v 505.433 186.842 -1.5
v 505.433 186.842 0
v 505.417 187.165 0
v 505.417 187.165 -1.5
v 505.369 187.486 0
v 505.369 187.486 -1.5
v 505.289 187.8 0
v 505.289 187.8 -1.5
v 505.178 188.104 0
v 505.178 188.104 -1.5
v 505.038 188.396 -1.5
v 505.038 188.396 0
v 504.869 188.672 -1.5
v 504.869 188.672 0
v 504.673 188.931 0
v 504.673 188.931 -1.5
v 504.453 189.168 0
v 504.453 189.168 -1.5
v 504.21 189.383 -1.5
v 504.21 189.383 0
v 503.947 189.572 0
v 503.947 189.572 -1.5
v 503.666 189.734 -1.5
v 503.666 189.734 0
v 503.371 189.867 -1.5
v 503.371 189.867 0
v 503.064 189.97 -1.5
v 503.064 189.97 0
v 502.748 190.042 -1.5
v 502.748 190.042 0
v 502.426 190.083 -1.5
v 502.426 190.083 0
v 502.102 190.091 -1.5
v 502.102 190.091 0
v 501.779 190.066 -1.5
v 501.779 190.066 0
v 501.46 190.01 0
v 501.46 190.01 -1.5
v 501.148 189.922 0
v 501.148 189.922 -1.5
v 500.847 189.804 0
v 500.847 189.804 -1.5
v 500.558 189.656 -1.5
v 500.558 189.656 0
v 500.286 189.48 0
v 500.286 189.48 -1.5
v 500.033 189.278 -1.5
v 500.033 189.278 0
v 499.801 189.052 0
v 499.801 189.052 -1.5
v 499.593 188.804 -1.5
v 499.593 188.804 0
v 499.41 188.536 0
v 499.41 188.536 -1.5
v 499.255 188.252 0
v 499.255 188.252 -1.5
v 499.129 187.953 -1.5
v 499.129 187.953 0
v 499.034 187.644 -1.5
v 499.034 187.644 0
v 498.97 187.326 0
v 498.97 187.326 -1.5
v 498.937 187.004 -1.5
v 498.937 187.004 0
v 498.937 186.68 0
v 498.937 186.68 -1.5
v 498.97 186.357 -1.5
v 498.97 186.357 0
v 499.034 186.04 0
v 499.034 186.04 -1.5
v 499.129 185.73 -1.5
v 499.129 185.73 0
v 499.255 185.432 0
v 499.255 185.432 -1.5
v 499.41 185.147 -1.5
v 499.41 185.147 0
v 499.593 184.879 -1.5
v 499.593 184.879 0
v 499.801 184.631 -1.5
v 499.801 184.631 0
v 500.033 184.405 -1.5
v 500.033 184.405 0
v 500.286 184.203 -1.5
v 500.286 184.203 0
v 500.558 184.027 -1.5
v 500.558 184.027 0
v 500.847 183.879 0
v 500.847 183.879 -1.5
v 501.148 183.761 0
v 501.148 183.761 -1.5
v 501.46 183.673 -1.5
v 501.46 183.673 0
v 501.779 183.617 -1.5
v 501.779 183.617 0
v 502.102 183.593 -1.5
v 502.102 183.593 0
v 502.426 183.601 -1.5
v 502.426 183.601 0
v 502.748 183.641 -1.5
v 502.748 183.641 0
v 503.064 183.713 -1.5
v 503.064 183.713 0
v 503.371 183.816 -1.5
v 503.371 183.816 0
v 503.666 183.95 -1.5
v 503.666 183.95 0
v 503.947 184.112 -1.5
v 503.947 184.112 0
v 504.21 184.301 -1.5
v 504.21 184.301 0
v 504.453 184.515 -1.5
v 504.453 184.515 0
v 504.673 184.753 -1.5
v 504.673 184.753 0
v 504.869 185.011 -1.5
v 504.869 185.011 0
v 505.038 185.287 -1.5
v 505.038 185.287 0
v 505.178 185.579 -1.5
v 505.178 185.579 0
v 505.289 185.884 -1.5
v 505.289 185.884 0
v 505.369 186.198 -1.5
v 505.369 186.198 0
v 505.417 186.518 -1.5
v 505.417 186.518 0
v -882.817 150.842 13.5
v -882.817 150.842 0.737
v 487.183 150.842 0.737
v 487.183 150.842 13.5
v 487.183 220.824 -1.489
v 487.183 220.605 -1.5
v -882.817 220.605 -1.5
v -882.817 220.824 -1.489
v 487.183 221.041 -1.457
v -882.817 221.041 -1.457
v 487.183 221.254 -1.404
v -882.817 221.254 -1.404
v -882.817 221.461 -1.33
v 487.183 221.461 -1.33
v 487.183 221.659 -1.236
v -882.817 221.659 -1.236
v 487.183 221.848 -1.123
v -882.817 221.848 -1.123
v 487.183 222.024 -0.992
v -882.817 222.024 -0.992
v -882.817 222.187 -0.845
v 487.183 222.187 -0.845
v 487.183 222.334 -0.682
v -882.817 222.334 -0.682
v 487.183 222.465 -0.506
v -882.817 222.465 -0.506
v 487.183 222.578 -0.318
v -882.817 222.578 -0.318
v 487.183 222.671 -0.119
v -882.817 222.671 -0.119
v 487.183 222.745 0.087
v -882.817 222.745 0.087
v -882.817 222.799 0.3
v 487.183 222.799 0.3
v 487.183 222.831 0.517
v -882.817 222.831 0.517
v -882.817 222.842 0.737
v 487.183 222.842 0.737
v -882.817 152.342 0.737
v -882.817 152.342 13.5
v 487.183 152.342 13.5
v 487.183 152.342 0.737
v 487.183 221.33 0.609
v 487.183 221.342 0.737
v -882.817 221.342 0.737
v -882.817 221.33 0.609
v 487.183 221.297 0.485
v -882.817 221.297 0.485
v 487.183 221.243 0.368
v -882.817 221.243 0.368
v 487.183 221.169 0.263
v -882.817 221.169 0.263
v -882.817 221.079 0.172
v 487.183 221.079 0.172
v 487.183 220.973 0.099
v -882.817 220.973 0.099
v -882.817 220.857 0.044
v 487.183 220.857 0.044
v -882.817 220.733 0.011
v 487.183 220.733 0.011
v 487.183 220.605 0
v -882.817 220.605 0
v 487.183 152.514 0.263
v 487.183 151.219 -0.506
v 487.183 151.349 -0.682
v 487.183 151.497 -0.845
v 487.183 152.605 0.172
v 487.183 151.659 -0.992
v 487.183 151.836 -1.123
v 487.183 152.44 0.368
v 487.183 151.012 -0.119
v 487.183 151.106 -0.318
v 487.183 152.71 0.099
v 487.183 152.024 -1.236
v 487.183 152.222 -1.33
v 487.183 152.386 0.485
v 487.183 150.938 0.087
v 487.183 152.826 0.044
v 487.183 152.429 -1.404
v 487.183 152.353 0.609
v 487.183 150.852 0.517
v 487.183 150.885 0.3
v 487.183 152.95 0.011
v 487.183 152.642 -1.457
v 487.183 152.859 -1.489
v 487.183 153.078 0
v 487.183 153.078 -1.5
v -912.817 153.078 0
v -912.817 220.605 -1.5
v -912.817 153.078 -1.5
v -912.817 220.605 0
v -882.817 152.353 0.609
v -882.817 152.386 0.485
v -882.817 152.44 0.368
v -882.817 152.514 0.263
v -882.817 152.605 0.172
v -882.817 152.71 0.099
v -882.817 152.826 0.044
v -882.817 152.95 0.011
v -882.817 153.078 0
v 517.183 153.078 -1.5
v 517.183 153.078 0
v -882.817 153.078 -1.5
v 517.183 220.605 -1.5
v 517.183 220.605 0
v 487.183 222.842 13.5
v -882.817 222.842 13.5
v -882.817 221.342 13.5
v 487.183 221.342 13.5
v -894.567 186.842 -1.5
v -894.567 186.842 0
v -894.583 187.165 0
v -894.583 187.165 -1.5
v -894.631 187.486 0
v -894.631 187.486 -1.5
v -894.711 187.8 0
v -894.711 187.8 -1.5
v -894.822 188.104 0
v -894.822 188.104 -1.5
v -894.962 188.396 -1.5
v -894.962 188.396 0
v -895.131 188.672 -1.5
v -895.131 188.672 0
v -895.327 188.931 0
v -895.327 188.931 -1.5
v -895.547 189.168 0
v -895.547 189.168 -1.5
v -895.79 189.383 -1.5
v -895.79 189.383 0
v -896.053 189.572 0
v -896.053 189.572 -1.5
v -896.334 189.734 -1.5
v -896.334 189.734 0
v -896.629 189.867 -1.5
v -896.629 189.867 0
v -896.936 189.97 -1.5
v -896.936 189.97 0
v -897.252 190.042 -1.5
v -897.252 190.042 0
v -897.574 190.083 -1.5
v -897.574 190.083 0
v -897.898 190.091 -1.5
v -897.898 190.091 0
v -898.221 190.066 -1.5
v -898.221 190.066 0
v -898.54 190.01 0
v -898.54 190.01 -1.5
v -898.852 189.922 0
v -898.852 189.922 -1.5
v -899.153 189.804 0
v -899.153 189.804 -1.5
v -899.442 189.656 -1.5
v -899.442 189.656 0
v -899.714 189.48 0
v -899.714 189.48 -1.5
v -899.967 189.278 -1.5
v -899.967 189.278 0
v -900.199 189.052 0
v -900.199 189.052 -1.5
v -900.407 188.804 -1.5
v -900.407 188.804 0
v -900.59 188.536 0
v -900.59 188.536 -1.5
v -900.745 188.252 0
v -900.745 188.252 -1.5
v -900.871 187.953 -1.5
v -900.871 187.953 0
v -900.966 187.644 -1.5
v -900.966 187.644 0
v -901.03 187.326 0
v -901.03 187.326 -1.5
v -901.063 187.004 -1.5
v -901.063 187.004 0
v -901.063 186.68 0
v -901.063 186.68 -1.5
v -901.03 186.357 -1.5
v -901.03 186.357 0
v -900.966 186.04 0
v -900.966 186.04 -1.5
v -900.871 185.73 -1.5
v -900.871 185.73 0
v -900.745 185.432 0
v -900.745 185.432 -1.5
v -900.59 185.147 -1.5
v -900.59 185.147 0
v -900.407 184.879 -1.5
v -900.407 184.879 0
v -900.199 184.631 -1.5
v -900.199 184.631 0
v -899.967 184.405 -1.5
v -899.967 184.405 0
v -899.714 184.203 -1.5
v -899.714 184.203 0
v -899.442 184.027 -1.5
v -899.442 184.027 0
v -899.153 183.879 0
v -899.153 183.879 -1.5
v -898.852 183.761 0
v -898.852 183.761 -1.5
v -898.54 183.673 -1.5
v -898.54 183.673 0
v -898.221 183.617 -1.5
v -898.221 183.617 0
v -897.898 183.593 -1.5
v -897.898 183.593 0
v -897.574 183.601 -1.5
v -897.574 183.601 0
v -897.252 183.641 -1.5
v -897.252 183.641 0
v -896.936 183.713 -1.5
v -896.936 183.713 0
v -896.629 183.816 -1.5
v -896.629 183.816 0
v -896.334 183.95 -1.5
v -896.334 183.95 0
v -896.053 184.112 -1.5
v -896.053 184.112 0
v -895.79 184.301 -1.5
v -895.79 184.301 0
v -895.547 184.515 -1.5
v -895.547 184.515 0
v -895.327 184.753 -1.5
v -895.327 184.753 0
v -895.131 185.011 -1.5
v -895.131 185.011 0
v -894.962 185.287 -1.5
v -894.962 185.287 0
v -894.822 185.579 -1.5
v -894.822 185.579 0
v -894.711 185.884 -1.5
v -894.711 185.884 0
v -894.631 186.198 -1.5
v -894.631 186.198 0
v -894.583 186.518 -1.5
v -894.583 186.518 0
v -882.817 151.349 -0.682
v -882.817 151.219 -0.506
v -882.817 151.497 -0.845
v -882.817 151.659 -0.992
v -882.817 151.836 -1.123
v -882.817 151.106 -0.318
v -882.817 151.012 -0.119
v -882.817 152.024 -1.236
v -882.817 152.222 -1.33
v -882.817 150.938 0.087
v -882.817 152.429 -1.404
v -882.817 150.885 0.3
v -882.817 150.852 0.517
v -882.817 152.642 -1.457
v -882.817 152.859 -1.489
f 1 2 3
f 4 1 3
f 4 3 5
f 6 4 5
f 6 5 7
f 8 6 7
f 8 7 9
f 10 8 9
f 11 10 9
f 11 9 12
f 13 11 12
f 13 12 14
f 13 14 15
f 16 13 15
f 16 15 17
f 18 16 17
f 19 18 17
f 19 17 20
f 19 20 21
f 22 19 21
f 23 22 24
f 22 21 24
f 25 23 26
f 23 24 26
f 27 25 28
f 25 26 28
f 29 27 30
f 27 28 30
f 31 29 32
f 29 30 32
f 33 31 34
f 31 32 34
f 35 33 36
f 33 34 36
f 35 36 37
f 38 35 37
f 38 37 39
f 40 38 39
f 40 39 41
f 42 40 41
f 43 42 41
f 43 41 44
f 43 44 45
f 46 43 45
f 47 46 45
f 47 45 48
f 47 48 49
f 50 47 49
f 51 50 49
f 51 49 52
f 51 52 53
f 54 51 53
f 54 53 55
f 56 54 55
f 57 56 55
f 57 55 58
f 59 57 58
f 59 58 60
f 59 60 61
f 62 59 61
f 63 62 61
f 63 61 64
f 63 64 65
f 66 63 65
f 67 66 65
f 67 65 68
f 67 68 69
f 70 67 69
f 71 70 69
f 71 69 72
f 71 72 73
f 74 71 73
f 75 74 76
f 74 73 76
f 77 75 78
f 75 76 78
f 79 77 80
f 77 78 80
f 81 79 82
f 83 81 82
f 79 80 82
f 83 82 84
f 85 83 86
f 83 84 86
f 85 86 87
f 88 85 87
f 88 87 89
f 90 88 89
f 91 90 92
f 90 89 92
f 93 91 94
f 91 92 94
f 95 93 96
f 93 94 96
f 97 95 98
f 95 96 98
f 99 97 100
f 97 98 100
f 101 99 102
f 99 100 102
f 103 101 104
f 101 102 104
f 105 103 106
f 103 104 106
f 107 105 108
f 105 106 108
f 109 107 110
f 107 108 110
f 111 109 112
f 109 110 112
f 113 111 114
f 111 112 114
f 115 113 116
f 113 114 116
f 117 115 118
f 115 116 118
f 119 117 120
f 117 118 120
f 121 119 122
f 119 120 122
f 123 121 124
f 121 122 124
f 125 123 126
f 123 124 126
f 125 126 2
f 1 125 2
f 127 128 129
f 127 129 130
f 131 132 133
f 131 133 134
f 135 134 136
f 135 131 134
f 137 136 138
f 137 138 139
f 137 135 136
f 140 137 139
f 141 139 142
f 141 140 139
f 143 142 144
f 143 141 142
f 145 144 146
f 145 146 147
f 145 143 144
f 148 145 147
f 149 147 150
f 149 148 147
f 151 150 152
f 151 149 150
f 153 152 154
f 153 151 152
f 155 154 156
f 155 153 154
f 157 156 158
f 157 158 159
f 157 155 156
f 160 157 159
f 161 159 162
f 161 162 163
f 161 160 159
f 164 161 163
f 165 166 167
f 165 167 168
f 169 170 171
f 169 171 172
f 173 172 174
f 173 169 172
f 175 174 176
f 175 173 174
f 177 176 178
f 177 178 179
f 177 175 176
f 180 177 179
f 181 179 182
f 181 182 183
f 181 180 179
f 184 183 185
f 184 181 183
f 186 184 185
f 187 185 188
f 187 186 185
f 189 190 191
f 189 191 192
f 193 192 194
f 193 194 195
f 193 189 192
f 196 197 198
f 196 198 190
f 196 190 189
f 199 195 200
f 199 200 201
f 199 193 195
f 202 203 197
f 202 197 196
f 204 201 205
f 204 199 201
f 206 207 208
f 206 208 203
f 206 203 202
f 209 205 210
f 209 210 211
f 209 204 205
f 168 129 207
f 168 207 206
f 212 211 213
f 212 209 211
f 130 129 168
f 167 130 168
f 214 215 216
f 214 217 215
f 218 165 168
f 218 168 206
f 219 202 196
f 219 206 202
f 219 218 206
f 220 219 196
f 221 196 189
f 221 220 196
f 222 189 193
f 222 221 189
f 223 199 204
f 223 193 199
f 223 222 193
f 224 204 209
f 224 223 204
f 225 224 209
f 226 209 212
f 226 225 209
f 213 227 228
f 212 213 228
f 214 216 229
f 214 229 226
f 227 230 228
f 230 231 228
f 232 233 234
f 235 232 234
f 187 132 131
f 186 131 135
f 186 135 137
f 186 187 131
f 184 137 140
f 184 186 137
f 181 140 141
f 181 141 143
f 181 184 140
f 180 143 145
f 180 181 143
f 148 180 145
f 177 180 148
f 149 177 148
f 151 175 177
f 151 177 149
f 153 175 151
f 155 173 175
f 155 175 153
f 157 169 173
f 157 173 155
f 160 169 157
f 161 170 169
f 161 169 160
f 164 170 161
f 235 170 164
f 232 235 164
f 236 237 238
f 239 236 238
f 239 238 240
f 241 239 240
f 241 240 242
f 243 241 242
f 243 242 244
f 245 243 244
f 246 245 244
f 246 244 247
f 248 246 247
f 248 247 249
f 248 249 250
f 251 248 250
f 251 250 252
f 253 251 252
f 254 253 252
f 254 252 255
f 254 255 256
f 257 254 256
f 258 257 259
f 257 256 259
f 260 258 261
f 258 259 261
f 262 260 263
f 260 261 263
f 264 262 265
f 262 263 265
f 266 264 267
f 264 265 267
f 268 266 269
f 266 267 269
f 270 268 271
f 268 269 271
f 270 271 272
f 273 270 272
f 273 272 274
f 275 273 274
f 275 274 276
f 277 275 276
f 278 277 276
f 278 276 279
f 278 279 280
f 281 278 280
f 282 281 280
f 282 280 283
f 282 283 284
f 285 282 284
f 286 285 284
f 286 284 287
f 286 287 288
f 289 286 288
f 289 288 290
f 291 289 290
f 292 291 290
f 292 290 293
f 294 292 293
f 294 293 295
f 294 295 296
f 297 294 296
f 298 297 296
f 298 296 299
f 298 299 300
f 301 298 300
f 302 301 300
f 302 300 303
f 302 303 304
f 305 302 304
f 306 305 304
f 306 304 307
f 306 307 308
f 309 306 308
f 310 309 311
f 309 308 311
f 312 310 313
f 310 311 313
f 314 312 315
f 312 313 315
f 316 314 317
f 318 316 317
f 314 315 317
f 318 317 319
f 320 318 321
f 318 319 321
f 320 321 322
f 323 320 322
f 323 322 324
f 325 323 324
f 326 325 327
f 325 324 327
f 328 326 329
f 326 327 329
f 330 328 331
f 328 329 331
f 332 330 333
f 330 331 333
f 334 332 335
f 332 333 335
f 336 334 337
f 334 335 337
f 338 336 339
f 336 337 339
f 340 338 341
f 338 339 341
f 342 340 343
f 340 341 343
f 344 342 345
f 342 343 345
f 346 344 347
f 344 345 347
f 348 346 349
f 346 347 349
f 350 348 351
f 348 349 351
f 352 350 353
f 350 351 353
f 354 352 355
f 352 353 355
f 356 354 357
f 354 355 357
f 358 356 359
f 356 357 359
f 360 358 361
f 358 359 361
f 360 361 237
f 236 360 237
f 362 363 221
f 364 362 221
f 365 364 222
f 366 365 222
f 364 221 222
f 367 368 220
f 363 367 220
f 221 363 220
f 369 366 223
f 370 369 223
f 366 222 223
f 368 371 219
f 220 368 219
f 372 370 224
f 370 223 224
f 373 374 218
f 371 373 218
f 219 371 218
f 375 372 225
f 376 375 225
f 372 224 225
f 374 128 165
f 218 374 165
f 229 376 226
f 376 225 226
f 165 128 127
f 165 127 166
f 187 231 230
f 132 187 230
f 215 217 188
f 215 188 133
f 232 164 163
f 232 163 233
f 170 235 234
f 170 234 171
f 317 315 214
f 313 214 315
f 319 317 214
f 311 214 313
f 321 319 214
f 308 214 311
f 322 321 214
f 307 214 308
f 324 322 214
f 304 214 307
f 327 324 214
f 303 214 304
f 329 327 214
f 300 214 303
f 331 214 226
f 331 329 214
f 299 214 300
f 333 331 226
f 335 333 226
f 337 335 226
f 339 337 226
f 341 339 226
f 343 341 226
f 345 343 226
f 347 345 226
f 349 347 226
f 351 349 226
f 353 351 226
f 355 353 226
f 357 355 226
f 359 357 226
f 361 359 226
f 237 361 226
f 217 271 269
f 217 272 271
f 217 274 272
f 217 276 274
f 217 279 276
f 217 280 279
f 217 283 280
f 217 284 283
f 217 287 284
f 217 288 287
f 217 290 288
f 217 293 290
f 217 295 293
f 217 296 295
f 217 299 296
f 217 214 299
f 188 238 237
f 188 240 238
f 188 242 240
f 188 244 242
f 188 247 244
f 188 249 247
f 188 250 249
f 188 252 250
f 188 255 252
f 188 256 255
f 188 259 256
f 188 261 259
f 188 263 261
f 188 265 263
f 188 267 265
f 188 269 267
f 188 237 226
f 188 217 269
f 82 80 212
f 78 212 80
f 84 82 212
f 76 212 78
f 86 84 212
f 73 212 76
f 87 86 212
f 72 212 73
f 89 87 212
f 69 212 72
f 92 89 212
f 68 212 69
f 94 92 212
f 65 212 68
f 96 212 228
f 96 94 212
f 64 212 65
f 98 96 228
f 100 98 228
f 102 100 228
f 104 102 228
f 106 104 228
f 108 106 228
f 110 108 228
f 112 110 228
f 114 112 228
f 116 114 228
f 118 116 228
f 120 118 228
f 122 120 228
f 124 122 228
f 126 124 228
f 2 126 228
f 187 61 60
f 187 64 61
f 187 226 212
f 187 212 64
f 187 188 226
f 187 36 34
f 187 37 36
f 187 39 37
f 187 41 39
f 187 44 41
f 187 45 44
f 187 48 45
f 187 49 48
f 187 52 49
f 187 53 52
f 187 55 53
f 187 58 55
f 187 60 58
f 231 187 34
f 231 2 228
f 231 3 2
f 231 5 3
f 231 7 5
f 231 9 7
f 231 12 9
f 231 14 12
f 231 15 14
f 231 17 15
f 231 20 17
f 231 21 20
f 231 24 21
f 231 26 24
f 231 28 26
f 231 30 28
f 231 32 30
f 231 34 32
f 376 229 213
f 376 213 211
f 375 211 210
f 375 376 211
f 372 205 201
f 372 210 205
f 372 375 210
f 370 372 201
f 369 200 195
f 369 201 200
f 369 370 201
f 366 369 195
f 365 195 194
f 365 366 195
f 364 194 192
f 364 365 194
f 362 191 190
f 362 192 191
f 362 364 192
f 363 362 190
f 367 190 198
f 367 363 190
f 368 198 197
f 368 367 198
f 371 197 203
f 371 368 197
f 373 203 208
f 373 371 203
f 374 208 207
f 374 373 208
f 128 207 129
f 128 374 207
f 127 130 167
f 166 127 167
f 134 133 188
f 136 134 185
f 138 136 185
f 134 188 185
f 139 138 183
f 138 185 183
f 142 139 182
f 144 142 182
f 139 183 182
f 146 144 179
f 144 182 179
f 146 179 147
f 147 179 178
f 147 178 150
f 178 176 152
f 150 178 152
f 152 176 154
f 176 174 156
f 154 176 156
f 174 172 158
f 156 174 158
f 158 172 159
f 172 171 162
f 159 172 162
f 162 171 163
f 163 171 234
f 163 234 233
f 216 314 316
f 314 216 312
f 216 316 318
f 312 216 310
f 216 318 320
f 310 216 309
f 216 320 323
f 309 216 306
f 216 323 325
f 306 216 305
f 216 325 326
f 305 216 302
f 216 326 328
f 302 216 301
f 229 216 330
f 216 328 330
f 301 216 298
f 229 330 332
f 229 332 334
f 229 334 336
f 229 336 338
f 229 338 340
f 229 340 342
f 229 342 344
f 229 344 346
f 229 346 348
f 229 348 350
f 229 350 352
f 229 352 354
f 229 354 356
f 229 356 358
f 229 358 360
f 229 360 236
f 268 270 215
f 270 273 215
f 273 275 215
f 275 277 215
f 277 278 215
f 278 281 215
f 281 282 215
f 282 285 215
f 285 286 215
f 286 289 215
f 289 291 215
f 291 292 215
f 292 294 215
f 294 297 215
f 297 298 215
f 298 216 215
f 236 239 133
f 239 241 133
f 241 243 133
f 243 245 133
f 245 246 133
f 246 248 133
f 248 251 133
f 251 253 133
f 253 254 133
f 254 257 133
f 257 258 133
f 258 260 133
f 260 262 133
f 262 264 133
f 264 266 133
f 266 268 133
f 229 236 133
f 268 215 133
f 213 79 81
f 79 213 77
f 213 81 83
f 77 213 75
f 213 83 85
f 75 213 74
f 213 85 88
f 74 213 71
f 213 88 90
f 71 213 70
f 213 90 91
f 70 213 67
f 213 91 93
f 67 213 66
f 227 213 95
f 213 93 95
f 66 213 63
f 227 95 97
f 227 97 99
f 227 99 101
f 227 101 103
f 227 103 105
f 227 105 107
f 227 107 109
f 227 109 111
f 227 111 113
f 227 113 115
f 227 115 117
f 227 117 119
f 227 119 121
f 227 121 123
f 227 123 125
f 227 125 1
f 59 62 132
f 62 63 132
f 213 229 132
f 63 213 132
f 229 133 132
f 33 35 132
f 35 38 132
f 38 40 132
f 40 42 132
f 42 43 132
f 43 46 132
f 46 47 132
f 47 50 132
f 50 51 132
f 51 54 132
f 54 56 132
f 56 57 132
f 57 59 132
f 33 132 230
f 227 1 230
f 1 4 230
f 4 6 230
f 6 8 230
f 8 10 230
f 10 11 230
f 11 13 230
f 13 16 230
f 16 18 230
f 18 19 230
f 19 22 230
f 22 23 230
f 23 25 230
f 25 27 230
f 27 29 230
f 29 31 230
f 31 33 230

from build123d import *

# Parameters (mm, degrees)
SKETCH1_W                    = 1430
SKETCH1_H                    = 72
BASE_FLANGE1_DEPTH           = 1.5
EDGE_FLANGE1_STRIP_W         = 7.4732
EDGE_FLANGE1_STRIP_H         = 1.5
EDGE_FLANGE1_STRIP_CUT_DEPTH = 1430
EDGE_FLANGE1_DEPTH           = 1430
EDGE_FLANGE2_STRIP_W         = 7.4732
EDGE_FLANGE2_STRIP_H         = 1.5
EDGE_FLANGE2_STRIP_CUT_DEPTH = 1430
EDGE_FLANGE2_DEPTH           = 1430
CUT_EXTRUDE1_START           = -912.816666667
CUT_EXTRUDE1_DEPTH           = 30
CUT_EXTRUDE2_START           = 487.183333333
CUT_EXTRUDE2_DEPTH           = 30
SKETCH14_R                   = 3.25
CUT_EXTRUDE3_DEPTH           = 10


# Read off the part's stored shape, not the designer's step: Cut-Extrude1, Cut-Extrude2
# Sheet-metal steps are written as plain solids
with BuildPart() as part:
    # Sketch1 → Base-Flange1 (new body)
    with BuildSketch(Plane.XY):
        with Locations((-197.816666667, 186.841666667)):
            Rectangle(SKETCH1_W, SKETCH1_H)
    extrude(amount=-BASE_FLANGE1_DEPTH)

    # Edge-Flange1 strip (across the edge) → Edge-Flange1 strip cut (cut)
    with BuildSketch(Plane(origin=(517.183333333, 222.841666667, 0), x_dir=(0, -1, 0), z_dir=(-1, 0, 0))):
        with Locations((-1.5, -0.75)):
            Rectangle(EDGE_FLANGE1_STRIP_W, EDGE_FLANGE1_STRIP_H)
    extrude(amount=EDGE_FLANGE1_STRIP_CUT_DEPTH, mode=Mode.SUBTRACT)

    # Edge-Flange1 section (across the edge) → Edge-Flange1 (add)
    with BuildSketch(Plane(origin=(517.183333333, 222.841666667, 0), x_dir=(0, -1, 0), z_dir=(-1, 0, 0))):
        with BuildLine():
            Line((0, 0.7366), (0, 13.5))
            Line((0, 13.5), (1.5, 13.5))
            Line((1.5, 13.5), (1.5, 0.7366))
            ThreePointArc((1.5, 0.7366), (1.715745145, 0.215745145), (2.2366, 0))
            Line((2.2366, 0), (2.2366, -1.5))
            ThreePointArc((2.2366, -1.5), (0.655084973, -0.844915027), (0, 0.7366))
        make_face()
    extrude(amount=EDGE_FLANGE1_DEPTH)

    # Edge-Flange2 strip (across the edge) → Edge-Flange2 strip cut (cut)
    with BuildSketch(Plane(origin=(-912.816666667, 150.841666667, 0), x_dir=(0, 1, 0), z_dir=(1, 0, 0))):
        with Locations((-1.5, -0.75)):
            Rectangle(EDGE_FLANGE2_STRIP_W, EDGE_FLANGE2_STRIP_H)
    extrude(amount=EDGE_FLANGE2_STRIP_CUT_DEPTH, mode=Mode.SUBTRACT)

    # Edge-Flange2 section (across the edge) → Edge-Flange2 (add)
    with BuildSketch(Plane(origin=(-912.816666667, 150.841666667, 0), x_dir=(0, 1, 0), z_dir=(1, 0, 0))):
        with BuildLine():
            Line((0, 0.7366), (0, 13.5))
            Line((0, 13.5), (1.5, 13.5))
            Line((1.5, 13.5), (1.5, 0.7366))
            ThreePointArc((1.5, 0.7366), (1.715745145, 0.215745145), (2.2366, 0))
            Line((2.2366, 0), (2.2366, -1.5))
            ThreePointArc((2.2366, -1.5), (0.655084973, -0.844915027), (0, 0.7366))
        make_face()
    extrude(amount=EDGE_FLANGE2_DEPTH)

    # Cut-Extrude1 outline → Cut-Extrude1 (cut)
    with BuildSketch(Plane.YZ.offset(CUT_EXTRUDE1_START)):
        with BuildLine():
            ThreePointArc((150.841666667, 0.7366), (151.49675164, -0.844915027), (153.078266667, -1.5))
            Line((153.078266667, -1.5), (153.078266667, 0))
            ThreePointArc((153.078266667, 0), (152.557411812, 0.215745145), (152.341666667, 0.7366))
            Line((152.341666667, 0.7366), (152.341666667, 13.5))
            Line((152.341666667, 13.5), (150.841666667, 13.5))
            Line((150.841666667, 13.5), (150.841666667, 0.7366))
        make_face()
        with BuildLine():
            ThreePointArc((221.341666667, 0.7366), (221.125921522, 0.215745145), (220.605066667, 0))
            Line((220.605066667, 0), (220.605066667, -1.5))
            ThreePointArc((220.605066667, -1.5), (222.186581693, -0.844915026), (222.841666667, 0.7366))
            Line((222.841666667, 0.7366), (222.841666667, 13.5))
            Line((222.841666667, 13.5), (221.341666667, 13.5))
            Line((221.341666667, 13.5), (221.341666667, 0.7366))
        make_face()
    extrude(amount=CUT_EXTRUDE1_DEPTH, mode=Mode.SUBTRACT)

    # Cut-Extrude2 outline → Cut-Extrude2 (cut)
    with BuildSketch(Plane.YZ.offset(CUT_EXTRUDE2_START)):
        with BuildLine():
            ThreePointArc((150.841666667, 0.7366), (151.49675164, -0.844915027), (153.078266667, -1.5))
            Line((153.078266667, -1.5), (153.078266667, 0))
            ThreePointArc((153.078266667, 0), (152.557411812, 0.215745145), (152.341666667, 0.7366))
            Line((152.341666667, 0.7366), (152.341666667, 13.5))
            Line((152.341666667, 13.5), (150.841666667, 13.5))
            Line((150.841666667, 13.5), (150.841666667, 0.7366))
        make_face()
        with BuildLine():
            ThreePointArc((221.341666667, 0.7366), (221.125921522, 0.215745145), (220.605066667, 0))
            Line((220.605066667, 0), (220.605066667, -1.5))
            ThreePointArc((220.605066667, -1.5), (222.186581693, -0.844915026), (222.841666667, 0.7366))
            Line((222.841666667, 0.7366), (222.841666667, 13.5))
            Line((222.841666667, 13.5), (221.341666667, 13.5))
            Line((221.341666667, 13.5), (221.341666667, 0.7366))
        make_face()
    extrude(amount=CUT_EXTRUDE2_DEPTH, mode=Mode.SUBTRACT)

    # Sketch14 → Cut-Extrude3 (cut)
    with BuildSketch(Plane.XY):
        with Locations((502.183333333, 186.841666667)):
            Circle(SKETCH14_R)
        with Locations((-897.816666667, 186.841666667)):
            Circle(SKETCH14_R)
    extrude(amount=-CUT_EXTRUDE3_DEPTH, mode=Mode.SUBTRACT)


solid = part.part
